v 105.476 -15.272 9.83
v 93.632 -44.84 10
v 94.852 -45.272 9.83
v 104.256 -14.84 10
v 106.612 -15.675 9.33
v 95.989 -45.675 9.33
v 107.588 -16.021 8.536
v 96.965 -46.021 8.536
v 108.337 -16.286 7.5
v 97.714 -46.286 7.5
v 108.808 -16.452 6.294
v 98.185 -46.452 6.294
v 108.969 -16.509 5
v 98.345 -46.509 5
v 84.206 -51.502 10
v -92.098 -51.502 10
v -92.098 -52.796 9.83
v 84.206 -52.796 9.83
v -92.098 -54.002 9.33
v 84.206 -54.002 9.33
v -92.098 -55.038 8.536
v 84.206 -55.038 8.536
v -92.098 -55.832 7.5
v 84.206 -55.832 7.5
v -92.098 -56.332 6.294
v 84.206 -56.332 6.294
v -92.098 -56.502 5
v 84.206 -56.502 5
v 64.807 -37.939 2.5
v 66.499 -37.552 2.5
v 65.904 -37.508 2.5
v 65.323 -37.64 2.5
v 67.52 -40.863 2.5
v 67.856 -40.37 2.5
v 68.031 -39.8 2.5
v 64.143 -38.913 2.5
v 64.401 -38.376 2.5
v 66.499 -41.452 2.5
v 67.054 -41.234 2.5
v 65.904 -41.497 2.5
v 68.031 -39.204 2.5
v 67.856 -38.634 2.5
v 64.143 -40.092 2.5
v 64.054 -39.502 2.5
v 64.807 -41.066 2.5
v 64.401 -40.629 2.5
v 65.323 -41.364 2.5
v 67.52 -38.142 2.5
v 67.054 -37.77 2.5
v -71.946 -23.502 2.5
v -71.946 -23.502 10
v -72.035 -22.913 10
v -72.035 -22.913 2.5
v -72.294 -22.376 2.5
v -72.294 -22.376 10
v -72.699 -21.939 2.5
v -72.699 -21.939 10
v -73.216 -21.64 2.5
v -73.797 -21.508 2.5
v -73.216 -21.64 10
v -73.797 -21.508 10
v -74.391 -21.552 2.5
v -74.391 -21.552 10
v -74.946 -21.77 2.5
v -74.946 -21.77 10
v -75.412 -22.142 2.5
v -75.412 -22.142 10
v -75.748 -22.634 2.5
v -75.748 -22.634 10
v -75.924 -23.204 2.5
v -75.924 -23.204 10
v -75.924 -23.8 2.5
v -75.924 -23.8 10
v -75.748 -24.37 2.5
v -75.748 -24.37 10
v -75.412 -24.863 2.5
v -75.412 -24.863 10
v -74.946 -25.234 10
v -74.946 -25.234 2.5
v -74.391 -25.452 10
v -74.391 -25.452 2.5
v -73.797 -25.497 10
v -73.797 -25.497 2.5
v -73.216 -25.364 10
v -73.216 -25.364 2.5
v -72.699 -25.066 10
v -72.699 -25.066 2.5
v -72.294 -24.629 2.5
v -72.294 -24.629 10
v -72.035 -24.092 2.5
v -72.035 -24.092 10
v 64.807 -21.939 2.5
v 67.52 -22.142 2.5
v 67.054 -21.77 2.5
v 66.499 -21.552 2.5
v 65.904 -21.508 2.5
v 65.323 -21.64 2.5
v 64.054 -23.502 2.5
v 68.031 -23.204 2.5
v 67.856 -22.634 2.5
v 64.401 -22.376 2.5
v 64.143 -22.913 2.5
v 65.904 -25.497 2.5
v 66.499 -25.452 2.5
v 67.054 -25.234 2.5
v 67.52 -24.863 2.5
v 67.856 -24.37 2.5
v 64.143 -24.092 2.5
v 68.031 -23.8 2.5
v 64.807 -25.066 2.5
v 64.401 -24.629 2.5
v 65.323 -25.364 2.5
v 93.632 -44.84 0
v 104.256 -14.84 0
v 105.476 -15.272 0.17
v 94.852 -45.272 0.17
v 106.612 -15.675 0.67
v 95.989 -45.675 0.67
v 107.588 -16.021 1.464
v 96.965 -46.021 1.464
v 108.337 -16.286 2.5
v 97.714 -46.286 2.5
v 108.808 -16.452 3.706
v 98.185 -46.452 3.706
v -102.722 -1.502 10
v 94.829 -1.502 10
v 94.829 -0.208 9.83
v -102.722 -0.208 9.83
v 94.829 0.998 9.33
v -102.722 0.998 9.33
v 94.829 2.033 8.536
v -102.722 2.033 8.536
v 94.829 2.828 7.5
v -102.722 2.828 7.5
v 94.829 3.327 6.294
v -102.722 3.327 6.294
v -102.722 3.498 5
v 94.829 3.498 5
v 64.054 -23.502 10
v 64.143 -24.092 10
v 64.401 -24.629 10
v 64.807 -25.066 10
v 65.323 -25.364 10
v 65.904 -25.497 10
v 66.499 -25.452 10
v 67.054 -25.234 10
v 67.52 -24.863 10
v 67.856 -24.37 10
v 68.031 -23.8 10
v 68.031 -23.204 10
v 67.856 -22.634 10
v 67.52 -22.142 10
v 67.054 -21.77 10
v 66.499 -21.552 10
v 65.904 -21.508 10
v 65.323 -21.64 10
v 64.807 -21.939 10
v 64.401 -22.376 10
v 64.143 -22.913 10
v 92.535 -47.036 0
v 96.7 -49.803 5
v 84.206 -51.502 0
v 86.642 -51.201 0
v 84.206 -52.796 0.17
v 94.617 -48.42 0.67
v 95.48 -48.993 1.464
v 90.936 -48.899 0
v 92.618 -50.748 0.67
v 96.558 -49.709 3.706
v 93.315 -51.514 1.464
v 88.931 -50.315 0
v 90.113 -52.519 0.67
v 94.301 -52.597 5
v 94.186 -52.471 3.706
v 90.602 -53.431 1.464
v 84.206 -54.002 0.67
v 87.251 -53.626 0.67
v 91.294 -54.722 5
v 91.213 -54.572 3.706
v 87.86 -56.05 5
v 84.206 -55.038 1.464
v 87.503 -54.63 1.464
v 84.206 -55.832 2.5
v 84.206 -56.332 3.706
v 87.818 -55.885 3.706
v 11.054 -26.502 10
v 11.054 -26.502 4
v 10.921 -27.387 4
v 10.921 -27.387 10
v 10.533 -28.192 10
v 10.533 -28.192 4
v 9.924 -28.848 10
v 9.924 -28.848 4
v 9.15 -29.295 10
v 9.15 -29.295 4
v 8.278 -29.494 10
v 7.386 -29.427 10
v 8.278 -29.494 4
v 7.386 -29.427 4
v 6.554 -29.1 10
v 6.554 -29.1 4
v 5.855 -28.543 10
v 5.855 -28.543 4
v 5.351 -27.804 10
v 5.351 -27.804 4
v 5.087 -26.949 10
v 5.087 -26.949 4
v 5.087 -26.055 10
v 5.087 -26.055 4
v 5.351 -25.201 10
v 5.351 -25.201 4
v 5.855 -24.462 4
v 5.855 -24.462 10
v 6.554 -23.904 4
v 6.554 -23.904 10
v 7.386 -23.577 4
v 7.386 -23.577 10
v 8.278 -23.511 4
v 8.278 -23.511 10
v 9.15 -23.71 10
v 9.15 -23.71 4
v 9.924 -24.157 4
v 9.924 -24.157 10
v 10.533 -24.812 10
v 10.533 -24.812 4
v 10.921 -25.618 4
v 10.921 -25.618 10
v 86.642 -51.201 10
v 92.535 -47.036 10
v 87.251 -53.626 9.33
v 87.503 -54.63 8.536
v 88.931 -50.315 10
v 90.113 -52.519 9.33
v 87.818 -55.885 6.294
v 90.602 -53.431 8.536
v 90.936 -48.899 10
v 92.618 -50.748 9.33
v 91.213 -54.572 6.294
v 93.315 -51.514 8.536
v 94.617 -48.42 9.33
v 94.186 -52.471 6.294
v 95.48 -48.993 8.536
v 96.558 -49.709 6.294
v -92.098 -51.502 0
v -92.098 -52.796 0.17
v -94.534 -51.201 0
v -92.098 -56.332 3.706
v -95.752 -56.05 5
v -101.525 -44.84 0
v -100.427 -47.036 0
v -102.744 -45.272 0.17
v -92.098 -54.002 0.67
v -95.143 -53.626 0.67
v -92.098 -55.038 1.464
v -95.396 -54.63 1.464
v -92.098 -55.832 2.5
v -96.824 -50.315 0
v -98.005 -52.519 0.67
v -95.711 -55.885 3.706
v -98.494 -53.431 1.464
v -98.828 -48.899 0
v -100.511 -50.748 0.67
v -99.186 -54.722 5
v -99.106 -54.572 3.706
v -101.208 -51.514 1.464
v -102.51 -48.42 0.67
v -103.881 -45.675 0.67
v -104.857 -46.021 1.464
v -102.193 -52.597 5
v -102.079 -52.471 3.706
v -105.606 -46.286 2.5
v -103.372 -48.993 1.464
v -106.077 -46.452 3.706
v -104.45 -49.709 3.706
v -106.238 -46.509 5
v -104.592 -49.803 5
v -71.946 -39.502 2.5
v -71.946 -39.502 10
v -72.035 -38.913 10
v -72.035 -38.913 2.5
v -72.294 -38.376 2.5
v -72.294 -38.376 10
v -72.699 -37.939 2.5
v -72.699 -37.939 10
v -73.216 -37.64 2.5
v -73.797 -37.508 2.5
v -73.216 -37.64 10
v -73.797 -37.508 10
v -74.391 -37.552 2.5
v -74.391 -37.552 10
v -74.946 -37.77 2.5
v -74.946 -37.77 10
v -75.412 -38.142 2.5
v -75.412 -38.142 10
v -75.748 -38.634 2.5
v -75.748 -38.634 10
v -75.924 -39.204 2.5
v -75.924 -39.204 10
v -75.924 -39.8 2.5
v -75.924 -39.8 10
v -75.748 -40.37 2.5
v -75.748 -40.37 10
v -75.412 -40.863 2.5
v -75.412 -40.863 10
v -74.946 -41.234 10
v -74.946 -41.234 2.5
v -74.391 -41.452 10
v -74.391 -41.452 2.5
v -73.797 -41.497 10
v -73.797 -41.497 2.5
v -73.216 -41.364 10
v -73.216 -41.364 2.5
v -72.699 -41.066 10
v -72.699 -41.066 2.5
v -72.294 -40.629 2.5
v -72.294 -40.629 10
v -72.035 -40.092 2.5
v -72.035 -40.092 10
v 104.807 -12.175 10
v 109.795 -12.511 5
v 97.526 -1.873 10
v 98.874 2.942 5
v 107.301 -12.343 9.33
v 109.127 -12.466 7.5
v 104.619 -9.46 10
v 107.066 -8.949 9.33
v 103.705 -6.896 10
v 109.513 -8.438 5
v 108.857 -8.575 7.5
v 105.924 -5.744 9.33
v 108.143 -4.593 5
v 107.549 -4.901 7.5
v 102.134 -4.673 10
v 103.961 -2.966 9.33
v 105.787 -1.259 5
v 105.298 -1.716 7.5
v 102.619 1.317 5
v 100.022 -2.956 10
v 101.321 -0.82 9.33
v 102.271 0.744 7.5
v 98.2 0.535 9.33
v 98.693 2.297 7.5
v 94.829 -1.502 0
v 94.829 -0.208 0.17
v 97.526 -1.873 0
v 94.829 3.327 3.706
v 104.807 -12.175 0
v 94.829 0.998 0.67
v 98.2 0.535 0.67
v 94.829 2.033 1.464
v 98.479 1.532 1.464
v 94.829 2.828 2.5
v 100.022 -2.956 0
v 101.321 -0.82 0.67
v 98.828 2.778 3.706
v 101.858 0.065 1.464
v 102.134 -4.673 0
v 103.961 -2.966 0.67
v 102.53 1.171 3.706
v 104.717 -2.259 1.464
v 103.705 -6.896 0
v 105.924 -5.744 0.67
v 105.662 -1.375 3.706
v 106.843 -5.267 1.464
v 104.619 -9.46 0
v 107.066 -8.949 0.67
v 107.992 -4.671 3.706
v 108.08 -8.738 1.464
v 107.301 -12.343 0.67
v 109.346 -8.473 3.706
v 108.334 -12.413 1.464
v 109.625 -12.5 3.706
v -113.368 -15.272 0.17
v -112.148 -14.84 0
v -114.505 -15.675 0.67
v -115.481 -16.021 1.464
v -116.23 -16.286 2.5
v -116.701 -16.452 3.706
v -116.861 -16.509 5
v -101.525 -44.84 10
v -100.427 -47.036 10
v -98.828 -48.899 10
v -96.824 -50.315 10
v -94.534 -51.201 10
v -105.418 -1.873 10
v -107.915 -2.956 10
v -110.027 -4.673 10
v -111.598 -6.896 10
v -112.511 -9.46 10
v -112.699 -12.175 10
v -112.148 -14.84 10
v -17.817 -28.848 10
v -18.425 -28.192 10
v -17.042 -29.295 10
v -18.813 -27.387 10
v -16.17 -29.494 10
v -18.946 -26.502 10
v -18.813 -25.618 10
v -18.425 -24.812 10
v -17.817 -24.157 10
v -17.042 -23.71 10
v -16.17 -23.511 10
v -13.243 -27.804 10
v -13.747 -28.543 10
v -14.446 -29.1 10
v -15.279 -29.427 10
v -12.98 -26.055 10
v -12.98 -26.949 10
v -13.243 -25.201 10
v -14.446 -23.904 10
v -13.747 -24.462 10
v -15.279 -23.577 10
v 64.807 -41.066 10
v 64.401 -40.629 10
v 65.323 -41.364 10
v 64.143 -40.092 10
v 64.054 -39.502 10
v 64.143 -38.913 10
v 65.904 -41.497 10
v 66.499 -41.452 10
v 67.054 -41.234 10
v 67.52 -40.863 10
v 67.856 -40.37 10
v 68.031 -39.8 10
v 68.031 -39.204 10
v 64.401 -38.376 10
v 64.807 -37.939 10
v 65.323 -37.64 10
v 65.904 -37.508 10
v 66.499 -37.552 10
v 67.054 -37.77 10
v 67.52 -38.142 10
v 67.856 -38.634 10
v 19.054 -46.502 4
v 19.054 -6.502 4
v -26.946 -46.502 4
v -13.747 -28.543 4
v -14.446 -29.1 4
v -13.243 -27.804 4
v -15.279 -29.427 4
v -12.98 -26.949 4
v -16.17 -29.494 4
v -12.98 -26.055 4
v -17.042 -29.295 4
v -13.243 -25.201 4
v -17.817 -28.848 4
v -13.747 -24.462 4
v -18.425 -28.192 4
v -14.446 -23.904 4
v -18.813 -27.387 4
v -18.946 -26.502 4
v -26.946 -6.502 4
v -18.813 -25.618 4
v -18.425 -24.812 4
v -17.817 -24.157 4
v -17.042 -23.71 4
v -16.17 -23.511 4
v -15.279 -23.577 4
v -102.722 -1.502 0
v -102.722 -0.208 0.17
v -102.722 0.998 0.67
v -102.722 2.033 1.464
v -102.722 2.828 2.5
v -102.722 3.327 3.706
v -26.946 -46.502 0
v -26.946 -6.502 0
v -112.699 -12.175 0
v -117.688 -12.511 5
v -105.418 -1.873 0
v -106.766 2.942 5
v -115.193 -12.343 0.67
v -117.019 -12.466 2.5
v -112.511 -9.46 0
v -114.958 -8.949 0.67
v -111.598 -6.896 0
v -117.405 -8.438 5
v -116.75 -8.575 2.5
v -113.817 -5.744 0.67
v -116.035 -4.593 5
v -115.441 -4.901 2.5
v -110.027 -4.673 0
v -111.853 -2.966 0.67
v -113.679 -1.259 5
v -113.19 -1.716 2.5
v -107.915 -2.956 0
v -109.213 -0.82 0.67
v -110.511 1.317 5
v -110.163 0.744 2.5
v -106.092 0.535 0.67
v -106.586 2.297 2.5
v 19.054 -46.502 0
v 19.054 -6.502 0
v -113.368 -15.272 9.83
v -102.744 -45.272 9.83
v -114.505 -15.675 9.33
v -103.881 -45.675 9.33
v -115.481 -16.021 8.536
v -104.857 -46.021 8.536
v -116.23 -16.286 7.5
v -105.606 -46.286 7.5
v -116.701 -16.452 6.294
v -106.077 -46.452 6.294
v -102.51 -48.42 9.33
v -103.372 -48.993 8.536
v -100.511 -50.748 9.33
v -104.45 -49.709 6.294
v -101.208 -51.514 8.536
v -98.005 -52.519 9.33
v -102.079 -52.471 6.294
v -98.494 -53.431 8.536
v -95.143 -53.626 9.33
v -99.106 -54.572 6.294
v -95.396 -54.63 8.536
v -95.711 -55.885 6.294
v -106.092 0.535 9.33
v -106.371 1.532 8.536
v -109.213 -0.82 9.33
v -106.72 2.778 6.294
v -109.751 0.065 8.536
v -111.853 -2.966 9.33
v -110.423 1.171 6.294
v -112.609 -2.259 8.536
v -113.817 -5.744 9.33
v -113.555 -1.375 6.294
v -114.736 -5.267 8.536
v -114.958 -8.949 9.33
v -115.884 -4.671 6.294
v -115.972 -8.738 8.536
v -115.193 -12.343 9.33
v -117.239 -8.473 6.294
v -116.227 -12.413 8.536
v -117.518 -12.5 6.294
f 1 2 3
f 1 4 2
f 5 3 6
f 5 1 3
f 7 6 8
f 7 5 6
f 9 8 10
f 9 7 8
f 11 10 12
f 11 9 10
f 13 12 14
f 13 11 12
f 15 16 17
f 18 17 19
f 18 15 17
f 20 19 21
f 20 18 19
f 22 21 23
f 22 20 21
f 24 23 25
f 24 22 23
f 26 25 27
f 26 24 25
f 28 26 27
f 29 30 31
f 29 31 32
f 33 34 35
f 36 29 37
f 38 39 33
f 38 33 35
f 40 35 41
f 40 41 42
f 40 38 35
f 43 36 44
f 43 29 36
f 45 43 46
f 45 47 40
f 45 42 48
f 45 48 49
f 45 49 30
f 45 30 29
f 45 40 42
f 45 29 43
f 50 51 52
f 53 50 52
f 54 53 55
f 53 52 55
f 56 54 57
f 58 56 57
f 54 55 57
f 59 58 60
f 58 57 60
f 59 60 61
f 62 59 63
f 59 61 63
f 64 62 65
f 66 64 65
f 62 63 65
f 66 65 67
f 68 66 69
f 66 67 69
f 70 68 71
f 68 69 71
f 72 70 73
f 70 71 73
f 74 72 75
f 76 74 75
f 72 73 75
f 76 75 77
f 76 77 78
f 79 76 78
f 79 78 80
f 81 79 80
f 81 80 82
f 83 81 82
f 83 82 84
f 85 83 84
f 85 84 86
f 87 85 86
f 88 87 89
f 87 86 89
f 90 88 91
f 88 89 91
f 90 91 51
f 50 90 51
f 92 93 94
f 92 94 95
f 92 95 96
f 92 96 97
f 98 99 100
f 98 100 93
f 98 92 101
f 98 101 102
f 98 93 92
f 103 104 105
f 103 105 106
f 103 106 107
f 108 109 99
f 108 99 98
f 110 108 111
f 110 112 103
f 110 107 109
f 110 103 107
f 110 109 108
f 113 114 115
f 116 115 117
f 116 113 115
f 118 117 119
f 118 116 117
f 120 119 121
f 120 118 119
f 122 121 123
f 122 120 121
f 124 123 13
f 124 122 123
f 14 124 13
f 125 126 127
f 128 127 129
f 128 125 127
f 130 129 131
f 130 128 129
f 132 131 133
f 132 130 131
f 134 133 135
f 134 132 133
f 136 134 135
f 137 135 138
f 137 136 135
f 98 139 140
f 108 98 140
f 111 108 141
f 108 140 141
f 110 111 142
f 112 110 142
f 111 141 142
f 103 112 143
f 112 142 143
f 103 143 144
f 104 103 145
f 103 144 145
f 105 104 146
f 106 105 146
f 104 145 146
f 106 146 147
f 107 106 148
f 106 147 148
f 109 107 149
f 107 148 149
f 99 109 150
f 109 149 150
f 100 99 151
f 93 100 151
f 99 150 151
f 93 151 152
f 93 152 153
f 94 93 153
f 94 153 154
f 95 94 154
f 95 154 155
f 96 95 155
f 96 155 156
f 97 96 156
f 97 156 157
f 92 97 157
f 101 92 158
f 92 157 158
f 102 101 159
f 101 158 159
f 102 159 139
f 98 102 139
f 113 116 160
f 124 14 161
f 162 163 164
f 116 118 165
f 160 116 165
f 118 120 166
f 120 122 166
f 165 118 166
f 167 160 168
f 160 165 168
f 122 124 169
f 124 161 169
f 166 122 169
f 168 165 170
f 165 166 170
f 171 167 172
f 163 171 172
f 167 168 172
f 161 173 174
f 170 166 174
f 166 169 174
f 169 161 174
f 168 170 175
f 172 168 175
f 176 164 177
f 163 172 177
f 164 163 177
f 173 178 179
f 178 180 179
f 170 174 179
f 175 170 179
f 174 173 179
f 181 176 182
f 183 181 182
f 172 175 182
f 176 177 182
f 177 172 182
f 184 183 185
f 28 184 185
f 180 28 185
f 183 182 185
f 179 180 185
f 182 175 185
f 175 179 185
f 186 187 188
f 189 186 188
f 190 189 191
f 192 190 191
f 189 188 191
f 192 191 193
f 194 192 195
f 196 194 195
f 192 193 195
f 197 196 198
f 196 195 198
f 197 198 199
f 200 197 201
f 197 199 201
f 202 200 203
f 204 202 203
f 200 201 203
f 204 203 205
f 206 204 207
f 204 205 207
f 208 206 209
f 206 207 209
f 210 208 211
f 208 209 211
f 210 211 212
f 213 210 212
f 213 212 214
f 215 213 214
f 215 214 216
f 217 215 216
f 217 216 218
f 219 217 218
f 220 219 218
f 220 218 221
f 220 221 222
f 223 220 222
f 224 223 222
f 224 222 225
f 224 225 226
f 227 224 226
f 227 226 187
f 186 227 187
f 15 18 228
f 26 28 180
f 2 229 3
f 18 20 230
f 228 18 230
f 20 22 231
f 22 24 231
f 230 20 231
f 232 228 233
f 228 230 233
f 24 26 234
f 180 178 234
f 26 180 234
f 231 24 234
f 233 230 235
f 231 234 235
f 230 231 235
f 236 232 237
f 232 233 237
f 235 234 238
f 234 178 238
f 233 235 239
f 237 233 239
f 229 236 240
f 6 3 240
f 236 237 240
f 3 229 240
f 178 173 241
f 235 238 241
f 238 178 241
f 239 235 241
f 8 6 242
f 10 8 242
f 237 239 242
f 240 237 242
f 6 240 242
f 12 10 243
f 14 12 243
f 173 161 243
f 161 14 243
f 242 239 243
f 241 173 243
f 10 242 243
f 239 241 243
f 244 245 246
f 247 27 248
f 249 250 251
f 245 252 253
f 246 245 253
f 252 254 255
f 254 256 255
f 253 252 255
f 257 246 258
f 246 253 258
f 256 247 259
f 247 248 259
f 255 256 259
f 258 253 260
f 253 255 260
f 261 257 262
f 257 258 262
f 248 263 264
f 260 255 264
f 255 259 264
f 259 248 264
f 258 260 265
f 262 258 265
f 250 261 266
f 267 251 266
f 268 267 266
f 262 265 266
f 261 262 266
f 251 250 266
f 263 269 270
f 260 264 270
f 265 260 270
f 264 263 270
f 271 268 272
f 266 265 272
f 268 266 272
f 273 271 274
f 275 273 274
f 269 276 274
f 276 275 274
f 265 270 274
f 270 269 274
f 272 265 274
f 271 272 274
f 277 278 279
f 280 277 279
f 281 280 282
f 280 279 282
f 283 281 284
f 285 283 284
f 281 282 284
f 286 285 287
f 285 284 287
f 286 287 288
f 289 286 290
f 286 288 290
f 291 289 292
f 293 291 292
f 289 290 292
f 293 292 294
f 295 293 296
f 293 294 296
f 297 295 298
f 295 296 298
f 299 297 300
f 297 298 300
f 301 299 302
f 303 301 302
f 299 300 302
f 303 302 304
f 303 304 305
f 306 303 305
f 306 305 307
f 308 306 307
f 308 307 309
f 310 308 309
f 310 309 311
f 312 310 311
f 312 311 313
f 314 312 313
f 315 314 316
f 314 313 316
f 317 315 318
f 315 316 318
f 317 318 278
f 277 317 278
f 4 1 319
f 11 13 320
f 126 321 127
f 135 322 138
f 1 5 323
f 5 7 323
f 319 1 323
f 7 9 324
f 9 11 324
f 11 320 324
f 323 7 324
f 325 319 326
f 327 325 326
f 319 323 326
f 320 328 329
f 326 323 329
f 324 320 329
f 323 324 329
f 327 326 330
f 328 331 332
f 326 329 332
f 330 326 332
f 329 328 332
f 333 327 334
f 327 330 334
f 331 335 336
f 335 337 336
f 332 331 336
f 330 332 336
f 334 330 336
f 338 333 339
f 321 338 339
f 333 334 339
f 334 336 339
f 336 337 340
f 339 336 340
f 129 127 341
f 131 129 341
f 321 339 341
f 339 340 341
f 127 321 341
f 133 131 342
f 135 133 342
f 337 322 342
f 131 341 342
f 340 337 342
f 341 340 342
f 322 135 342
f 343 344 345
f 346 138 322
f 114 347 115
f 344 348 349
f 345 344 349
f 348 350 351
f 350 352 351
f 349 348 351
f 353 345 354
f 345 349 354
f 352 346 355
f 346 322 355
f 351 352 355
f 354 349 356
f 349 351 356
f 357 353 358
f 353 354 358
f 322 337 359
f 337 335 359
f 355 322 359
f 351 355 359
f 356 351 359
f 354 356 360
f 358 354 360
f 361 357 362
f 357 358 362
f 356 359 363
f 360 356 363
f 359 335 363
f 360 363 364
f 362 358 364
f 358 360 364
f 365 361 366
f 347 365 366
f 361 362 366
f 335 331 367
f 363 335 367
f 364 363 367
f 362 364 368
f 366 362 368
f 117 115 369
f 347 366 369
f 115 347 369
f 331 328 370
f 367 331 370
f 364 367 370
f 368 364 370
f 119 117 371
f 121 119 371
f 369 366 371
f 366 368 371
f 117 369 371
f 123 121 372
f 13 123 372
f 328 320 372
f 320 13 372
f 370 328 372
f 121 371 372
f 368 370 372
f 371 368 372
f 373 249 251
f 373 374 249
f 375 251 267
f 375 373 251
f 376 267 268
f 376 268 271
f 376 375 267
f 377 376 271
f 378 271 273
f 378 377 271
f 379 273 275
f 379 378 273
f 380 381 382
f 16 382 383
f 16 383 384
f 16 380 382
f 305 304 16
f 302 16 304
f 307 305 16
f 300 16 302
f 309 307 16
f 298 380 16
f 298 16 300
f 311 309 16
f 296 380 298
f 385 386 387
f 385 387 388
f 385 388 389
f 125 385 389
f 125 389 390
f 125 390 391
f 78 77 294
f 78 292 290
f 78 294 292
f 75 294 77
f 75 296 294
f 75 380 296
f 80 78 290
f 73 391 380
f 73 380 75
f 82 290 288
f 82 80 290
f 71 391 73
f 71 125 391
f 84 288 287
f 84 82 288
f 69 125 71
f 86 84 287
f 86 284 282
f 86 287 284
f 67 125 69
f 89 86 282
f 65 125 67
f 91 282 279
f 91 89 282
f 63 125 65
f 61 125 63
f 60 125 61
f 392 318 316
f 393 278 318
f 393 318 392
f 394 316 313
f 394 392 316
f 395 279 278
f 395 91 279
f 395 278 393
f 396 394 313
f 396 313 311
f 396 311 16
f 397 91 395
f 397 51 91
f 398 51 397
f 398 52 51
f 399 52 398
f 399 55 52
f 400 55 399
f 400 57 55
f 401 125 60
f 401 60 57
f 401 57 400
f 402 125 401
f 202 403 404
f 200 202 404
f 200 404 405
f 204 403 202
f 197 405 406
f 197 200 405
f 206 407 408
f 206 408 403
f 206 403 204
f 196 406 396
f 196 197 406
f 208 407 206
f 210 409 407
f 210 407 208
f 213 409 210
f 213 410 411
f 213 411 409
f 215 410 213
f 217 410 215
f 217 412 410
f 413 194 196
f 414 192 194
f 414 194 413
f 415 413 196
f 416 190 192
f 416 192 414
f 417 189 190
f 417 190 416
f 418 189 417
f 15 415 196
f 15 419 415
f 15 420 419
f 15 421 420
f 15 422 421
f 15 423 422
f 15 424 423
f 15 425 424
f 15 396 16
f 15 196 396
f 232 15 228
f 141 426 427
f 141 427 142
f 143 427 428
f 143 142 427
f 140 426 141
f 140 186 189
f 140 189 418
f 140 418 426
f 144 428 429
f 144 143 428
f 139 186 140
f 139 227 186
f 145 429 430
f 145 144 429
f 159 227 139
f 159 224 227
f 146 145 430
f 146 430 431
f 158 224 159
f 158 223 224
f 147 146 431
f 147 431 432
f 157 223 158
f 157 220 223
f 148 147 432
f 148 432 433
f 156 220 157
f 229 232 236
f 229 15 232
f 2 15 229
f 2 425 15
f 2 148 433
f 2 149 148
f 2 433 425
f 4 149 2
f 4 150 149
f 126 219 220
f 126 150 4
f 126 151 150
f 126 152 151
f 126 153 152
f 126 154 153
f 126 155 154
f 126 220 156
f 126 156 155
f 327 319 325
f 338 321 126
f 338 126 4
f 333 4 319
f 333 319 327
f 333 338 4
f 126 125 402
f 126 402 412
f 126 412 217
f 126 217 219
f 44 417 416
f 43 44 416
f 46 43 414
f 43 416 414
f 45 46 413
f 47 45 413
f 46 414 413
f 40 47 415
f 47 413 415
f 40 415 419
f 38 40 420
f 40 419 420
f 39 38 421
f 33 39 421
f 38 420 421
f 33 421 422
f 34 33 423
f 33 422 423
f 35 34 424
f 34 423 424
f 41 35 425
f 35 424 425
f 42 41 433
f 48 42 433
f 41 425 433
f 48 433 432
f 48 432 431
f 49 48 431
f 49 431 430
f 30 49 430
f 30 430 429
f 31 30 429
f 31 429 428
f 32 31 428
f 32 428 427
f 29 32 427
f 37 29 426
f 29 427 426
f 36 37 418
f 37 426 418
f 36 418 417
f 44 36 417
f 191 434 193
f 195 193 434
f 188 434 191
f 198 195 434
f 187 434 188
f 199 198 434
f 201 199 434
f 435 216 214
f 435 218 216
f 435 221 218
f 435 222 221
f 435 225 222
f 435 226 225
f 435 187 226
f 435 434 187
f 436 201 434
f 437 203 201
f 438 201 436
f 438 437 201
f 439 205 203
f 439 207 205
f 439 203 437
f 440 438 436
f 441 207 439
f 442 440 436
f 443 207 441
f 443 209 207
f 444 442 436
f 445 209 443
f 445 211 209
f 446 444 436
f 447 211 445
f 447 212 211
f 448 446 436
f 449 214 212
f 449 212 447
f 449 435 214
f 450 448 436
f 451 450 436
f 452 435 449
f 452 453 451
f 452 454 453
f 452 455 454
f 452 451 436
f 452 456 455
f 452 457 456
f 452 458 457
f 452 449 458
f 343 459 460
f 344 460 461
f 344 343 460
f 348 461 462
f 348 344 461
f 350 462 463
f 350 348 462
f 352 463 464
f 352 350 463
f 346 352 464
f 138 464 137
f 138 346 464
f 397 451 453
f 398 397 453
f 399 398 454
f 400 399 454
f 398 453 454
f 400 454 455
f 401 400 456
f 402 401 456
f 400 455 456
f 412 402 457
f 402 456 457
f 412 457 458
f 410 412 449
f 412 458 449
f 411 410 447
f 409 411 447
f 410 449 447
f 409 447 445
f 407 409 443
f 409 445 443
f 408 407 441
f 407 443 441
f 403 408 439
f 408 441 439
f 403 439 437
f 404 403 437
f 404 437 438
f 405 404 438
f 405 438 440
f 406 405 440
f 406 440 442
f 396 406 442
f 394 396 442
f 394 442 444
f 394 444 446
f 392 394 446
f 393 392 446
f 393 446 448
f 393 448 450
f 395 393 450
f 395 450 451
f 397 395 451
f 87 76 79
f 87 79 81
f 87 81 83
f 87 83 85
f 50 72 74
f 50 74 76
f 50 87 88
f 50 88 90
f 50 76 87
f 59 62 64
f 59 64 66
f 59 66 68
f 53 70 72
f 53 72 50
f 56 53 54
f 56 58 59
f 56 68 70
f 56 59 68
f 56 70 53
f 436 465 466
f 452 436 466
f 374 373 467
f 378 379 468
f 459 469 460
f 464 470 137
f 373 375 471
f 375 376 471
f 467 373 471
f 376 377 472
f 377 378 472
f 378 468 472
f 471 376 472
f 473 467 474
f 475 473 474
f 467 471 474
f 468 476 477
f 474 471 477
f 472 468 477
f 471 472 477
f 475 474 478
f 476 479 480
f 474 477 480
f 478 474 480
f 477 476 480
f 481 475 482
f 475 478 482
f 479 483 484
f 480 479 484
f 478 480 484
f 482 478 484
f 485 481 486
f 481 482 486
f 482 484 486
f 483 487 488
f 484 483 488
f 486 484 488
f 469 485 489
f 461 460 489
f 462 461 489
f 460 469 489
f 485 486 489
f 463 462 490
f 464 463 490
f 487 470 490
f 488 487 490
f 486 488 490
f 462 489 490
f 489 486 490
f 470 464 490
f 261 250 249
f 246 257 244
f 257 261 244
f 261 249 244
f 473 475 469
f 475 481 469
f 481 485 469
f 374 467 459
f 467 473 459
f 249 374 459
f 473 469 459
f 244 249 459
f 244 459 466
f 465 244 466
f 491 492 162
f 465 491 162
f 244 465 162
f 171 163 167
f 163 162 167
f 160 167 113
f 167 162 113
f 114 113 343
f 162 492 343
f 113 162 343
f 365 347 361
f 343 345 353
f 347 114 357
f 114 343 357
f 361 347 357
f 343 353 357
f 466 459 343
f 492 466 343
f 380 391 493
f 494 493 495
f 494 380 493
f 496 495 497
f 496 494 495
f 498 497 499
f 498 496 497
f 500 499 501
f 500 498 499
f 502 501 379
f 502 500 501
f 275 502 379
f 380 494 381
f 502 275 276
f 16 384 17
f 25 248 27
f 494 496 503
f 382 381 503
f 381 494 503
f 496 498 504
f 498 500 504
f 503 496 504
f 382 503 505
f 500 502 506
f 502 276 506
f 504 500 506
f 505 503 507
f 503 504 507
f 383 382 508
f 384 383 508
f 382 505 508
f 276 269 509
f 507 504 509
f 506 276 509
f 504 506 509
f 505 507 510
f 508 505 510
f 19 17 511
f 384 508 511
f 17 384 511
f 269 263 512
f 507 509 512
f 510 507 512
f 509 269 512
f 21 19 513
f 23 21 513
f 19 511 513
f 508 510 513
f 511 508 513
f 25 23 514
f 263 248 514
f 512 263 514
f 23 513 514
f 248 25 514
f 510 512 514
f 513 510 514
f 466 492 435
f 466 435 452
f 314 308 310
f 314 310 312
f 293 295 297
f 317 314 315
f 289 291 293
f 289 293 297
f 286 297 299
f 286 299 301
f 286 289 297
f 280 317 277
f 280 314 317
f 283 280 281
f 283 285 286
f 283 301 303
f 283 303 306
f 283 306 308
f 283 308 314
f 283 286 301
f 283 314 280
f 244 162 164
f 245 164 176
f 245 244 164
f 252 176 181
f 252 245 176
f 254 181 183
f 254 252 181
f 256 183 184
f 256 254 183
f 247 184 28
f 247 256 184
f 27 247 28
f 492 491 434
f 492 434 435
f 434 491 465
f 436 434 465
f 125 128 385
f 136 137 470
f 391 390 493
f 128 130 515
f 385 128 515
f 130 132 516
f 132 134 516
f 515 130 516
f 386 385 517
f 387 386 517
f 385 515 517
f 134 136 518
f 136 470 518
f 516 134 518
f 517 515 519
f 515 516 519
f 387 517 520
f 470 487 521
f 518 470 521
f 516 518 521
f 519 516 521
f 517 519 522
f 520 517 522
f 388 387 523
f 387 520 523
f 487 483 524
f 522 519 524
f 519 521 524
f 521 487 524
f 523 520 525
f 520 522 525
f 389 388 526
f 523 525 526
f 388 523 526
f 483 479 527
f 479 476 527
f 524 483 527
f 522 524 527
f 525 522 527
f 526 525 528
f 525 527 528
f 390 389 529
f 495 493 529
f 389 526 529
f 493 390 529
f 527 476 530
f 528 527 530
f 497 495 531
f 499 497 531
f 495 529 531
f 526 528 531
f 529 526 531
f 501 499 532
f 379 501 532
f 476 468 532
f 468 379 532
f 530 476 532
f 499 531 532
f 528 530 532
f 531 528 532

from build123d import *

# Parameters (mm, degrees)
EXTRUDE_1_DEPTH     = 10
FILLET_1_R          = 15
FILLET_2_R          = 5
SKETCH_2_R          = 2
CUT_EXTRUDE_1_DEPTH = 7.5
SKETCH_3_W          = 46
SKETCH_3_H          = 40
CUT_EXTRUDE_2_DEPTH = 4
SKETCH_8_R          = 3
CUT_EXTRUDE_3_DEPTH = 131.716858695


with BuildPart() as part:
    # 草圖1 → 填料-伸長1 (new body)
    with BuildSketch(Plane.XY):
        Polygon((-123.946188341, 3.497757848), (-102.699073989, -56.502242152), (94.806697307, -56.502242152), (116.053811659, 3.497757848), align=None)
    extrude(amount=EXTRUDE_1_DEPTH)

    # 圓角1
    fillet_1_edges = [part.edges().sort_by_distance(p)[0] for p in [
        (116.053811659, 3.497757848, 5),
        (94.806697307, -56.502242152, 5),
        (-102.699073989, -56.502242152, 5),
        (-123.946188341, 3.497757848, 5),
    ]]
    fillet(fillet_1_edges, radius=FILLET_1_R)

    # 圓角2
    fillet_2_edges = [part.edges().sort_by_distance(p)[0] for p in [
        (107.078925905, -2.845064302, 10),
        (103.657146356, -31.509345041, 10),
        (92.862923252, -53.75186548, 10),
        (-3.946188341, -56.502242152, 10),
        (-100.755299934, -53.75186548, 10),
        (-111.549523037, -31.509345041, 10),
        (-114.971302586, -2.845064302, 10),
        (-3.946188341, 3.497757848, 10),
        (-114.971302586, -2.845064302, 0),
        (-111.549523037, -31.509345041, 0),
        (-100.755299934, -53.75186548, 0),
        (-3.946188341, -56.502242152, 0),
        (92.862923252, -53.75186548, 0),
        (103.657146356, -31.509345041, 0),
        (107.078925905, -2.845064302, 0),
        (-3.946188341, 3.497757848, 0),
    ]]
    fillet(fillet_2_edges, radius=FILLET_2_R - 0.0001)  # a hair under: the kernel refuses the full size

    # 草圖2 → 除料-伸長1 (cut)
    with BuildSketch(Plane.XY.offset(10)):
        with Locations((-73.946188341, -23.502242152)):
            Circle(SKETCH_2_R)
        with Locations((-73.946188341, -39.502242152)):
            Circle(SKETCH_2_R)
        with Locations(Location((66.053811659, -39.502242152, 0), (0, 0, 180))):
            Circle(SKETCH_2_R)
        with Locations(Location((66.053811659, -23.502242152, 0), (0, 0, 180))):
            Circle(SKETCH_2_R)
    extrude(amount=-CUT_EXTRUDE_1_DEPTH, mode=Mode.SUBTRACT)

    # 草圖3 → 除料-伸長2 (cut)
    with BuildSketch(Plane(origin=(0, 0, 0), x_dir=(-1, 0, 0), z_dir=(0, 0, -1))):
        with Locations((3.946188341, -26.502242152)):
            Rectangle(SKETCH_3_W, SKETCH_3_H)
    extrude(amount=-CUT_EXTRUDE_2_DEPTH, mode=Mode.SUBTRACT)

    # 草圖8 → 除料-伸長3 (cut, through all)
    with BuildSketch(Plane(origin=(0, 0, 4), x_dir=(-1, 0, 0), z_dir=(0, 0, -1))):
        with Locations((15.946188341, -26.502242152)):
            Circle(SKETCH_8_R)
        with Locations(Location((-8.053811659, -26.502242152, 0), (0, 0, 180))):
            Circle(SKETCH_8_R)
    extrude(amount=-CUT_EXTRUDE_3_DEPTH, mode=Mode.SUBTRACT)


solid = part.part
